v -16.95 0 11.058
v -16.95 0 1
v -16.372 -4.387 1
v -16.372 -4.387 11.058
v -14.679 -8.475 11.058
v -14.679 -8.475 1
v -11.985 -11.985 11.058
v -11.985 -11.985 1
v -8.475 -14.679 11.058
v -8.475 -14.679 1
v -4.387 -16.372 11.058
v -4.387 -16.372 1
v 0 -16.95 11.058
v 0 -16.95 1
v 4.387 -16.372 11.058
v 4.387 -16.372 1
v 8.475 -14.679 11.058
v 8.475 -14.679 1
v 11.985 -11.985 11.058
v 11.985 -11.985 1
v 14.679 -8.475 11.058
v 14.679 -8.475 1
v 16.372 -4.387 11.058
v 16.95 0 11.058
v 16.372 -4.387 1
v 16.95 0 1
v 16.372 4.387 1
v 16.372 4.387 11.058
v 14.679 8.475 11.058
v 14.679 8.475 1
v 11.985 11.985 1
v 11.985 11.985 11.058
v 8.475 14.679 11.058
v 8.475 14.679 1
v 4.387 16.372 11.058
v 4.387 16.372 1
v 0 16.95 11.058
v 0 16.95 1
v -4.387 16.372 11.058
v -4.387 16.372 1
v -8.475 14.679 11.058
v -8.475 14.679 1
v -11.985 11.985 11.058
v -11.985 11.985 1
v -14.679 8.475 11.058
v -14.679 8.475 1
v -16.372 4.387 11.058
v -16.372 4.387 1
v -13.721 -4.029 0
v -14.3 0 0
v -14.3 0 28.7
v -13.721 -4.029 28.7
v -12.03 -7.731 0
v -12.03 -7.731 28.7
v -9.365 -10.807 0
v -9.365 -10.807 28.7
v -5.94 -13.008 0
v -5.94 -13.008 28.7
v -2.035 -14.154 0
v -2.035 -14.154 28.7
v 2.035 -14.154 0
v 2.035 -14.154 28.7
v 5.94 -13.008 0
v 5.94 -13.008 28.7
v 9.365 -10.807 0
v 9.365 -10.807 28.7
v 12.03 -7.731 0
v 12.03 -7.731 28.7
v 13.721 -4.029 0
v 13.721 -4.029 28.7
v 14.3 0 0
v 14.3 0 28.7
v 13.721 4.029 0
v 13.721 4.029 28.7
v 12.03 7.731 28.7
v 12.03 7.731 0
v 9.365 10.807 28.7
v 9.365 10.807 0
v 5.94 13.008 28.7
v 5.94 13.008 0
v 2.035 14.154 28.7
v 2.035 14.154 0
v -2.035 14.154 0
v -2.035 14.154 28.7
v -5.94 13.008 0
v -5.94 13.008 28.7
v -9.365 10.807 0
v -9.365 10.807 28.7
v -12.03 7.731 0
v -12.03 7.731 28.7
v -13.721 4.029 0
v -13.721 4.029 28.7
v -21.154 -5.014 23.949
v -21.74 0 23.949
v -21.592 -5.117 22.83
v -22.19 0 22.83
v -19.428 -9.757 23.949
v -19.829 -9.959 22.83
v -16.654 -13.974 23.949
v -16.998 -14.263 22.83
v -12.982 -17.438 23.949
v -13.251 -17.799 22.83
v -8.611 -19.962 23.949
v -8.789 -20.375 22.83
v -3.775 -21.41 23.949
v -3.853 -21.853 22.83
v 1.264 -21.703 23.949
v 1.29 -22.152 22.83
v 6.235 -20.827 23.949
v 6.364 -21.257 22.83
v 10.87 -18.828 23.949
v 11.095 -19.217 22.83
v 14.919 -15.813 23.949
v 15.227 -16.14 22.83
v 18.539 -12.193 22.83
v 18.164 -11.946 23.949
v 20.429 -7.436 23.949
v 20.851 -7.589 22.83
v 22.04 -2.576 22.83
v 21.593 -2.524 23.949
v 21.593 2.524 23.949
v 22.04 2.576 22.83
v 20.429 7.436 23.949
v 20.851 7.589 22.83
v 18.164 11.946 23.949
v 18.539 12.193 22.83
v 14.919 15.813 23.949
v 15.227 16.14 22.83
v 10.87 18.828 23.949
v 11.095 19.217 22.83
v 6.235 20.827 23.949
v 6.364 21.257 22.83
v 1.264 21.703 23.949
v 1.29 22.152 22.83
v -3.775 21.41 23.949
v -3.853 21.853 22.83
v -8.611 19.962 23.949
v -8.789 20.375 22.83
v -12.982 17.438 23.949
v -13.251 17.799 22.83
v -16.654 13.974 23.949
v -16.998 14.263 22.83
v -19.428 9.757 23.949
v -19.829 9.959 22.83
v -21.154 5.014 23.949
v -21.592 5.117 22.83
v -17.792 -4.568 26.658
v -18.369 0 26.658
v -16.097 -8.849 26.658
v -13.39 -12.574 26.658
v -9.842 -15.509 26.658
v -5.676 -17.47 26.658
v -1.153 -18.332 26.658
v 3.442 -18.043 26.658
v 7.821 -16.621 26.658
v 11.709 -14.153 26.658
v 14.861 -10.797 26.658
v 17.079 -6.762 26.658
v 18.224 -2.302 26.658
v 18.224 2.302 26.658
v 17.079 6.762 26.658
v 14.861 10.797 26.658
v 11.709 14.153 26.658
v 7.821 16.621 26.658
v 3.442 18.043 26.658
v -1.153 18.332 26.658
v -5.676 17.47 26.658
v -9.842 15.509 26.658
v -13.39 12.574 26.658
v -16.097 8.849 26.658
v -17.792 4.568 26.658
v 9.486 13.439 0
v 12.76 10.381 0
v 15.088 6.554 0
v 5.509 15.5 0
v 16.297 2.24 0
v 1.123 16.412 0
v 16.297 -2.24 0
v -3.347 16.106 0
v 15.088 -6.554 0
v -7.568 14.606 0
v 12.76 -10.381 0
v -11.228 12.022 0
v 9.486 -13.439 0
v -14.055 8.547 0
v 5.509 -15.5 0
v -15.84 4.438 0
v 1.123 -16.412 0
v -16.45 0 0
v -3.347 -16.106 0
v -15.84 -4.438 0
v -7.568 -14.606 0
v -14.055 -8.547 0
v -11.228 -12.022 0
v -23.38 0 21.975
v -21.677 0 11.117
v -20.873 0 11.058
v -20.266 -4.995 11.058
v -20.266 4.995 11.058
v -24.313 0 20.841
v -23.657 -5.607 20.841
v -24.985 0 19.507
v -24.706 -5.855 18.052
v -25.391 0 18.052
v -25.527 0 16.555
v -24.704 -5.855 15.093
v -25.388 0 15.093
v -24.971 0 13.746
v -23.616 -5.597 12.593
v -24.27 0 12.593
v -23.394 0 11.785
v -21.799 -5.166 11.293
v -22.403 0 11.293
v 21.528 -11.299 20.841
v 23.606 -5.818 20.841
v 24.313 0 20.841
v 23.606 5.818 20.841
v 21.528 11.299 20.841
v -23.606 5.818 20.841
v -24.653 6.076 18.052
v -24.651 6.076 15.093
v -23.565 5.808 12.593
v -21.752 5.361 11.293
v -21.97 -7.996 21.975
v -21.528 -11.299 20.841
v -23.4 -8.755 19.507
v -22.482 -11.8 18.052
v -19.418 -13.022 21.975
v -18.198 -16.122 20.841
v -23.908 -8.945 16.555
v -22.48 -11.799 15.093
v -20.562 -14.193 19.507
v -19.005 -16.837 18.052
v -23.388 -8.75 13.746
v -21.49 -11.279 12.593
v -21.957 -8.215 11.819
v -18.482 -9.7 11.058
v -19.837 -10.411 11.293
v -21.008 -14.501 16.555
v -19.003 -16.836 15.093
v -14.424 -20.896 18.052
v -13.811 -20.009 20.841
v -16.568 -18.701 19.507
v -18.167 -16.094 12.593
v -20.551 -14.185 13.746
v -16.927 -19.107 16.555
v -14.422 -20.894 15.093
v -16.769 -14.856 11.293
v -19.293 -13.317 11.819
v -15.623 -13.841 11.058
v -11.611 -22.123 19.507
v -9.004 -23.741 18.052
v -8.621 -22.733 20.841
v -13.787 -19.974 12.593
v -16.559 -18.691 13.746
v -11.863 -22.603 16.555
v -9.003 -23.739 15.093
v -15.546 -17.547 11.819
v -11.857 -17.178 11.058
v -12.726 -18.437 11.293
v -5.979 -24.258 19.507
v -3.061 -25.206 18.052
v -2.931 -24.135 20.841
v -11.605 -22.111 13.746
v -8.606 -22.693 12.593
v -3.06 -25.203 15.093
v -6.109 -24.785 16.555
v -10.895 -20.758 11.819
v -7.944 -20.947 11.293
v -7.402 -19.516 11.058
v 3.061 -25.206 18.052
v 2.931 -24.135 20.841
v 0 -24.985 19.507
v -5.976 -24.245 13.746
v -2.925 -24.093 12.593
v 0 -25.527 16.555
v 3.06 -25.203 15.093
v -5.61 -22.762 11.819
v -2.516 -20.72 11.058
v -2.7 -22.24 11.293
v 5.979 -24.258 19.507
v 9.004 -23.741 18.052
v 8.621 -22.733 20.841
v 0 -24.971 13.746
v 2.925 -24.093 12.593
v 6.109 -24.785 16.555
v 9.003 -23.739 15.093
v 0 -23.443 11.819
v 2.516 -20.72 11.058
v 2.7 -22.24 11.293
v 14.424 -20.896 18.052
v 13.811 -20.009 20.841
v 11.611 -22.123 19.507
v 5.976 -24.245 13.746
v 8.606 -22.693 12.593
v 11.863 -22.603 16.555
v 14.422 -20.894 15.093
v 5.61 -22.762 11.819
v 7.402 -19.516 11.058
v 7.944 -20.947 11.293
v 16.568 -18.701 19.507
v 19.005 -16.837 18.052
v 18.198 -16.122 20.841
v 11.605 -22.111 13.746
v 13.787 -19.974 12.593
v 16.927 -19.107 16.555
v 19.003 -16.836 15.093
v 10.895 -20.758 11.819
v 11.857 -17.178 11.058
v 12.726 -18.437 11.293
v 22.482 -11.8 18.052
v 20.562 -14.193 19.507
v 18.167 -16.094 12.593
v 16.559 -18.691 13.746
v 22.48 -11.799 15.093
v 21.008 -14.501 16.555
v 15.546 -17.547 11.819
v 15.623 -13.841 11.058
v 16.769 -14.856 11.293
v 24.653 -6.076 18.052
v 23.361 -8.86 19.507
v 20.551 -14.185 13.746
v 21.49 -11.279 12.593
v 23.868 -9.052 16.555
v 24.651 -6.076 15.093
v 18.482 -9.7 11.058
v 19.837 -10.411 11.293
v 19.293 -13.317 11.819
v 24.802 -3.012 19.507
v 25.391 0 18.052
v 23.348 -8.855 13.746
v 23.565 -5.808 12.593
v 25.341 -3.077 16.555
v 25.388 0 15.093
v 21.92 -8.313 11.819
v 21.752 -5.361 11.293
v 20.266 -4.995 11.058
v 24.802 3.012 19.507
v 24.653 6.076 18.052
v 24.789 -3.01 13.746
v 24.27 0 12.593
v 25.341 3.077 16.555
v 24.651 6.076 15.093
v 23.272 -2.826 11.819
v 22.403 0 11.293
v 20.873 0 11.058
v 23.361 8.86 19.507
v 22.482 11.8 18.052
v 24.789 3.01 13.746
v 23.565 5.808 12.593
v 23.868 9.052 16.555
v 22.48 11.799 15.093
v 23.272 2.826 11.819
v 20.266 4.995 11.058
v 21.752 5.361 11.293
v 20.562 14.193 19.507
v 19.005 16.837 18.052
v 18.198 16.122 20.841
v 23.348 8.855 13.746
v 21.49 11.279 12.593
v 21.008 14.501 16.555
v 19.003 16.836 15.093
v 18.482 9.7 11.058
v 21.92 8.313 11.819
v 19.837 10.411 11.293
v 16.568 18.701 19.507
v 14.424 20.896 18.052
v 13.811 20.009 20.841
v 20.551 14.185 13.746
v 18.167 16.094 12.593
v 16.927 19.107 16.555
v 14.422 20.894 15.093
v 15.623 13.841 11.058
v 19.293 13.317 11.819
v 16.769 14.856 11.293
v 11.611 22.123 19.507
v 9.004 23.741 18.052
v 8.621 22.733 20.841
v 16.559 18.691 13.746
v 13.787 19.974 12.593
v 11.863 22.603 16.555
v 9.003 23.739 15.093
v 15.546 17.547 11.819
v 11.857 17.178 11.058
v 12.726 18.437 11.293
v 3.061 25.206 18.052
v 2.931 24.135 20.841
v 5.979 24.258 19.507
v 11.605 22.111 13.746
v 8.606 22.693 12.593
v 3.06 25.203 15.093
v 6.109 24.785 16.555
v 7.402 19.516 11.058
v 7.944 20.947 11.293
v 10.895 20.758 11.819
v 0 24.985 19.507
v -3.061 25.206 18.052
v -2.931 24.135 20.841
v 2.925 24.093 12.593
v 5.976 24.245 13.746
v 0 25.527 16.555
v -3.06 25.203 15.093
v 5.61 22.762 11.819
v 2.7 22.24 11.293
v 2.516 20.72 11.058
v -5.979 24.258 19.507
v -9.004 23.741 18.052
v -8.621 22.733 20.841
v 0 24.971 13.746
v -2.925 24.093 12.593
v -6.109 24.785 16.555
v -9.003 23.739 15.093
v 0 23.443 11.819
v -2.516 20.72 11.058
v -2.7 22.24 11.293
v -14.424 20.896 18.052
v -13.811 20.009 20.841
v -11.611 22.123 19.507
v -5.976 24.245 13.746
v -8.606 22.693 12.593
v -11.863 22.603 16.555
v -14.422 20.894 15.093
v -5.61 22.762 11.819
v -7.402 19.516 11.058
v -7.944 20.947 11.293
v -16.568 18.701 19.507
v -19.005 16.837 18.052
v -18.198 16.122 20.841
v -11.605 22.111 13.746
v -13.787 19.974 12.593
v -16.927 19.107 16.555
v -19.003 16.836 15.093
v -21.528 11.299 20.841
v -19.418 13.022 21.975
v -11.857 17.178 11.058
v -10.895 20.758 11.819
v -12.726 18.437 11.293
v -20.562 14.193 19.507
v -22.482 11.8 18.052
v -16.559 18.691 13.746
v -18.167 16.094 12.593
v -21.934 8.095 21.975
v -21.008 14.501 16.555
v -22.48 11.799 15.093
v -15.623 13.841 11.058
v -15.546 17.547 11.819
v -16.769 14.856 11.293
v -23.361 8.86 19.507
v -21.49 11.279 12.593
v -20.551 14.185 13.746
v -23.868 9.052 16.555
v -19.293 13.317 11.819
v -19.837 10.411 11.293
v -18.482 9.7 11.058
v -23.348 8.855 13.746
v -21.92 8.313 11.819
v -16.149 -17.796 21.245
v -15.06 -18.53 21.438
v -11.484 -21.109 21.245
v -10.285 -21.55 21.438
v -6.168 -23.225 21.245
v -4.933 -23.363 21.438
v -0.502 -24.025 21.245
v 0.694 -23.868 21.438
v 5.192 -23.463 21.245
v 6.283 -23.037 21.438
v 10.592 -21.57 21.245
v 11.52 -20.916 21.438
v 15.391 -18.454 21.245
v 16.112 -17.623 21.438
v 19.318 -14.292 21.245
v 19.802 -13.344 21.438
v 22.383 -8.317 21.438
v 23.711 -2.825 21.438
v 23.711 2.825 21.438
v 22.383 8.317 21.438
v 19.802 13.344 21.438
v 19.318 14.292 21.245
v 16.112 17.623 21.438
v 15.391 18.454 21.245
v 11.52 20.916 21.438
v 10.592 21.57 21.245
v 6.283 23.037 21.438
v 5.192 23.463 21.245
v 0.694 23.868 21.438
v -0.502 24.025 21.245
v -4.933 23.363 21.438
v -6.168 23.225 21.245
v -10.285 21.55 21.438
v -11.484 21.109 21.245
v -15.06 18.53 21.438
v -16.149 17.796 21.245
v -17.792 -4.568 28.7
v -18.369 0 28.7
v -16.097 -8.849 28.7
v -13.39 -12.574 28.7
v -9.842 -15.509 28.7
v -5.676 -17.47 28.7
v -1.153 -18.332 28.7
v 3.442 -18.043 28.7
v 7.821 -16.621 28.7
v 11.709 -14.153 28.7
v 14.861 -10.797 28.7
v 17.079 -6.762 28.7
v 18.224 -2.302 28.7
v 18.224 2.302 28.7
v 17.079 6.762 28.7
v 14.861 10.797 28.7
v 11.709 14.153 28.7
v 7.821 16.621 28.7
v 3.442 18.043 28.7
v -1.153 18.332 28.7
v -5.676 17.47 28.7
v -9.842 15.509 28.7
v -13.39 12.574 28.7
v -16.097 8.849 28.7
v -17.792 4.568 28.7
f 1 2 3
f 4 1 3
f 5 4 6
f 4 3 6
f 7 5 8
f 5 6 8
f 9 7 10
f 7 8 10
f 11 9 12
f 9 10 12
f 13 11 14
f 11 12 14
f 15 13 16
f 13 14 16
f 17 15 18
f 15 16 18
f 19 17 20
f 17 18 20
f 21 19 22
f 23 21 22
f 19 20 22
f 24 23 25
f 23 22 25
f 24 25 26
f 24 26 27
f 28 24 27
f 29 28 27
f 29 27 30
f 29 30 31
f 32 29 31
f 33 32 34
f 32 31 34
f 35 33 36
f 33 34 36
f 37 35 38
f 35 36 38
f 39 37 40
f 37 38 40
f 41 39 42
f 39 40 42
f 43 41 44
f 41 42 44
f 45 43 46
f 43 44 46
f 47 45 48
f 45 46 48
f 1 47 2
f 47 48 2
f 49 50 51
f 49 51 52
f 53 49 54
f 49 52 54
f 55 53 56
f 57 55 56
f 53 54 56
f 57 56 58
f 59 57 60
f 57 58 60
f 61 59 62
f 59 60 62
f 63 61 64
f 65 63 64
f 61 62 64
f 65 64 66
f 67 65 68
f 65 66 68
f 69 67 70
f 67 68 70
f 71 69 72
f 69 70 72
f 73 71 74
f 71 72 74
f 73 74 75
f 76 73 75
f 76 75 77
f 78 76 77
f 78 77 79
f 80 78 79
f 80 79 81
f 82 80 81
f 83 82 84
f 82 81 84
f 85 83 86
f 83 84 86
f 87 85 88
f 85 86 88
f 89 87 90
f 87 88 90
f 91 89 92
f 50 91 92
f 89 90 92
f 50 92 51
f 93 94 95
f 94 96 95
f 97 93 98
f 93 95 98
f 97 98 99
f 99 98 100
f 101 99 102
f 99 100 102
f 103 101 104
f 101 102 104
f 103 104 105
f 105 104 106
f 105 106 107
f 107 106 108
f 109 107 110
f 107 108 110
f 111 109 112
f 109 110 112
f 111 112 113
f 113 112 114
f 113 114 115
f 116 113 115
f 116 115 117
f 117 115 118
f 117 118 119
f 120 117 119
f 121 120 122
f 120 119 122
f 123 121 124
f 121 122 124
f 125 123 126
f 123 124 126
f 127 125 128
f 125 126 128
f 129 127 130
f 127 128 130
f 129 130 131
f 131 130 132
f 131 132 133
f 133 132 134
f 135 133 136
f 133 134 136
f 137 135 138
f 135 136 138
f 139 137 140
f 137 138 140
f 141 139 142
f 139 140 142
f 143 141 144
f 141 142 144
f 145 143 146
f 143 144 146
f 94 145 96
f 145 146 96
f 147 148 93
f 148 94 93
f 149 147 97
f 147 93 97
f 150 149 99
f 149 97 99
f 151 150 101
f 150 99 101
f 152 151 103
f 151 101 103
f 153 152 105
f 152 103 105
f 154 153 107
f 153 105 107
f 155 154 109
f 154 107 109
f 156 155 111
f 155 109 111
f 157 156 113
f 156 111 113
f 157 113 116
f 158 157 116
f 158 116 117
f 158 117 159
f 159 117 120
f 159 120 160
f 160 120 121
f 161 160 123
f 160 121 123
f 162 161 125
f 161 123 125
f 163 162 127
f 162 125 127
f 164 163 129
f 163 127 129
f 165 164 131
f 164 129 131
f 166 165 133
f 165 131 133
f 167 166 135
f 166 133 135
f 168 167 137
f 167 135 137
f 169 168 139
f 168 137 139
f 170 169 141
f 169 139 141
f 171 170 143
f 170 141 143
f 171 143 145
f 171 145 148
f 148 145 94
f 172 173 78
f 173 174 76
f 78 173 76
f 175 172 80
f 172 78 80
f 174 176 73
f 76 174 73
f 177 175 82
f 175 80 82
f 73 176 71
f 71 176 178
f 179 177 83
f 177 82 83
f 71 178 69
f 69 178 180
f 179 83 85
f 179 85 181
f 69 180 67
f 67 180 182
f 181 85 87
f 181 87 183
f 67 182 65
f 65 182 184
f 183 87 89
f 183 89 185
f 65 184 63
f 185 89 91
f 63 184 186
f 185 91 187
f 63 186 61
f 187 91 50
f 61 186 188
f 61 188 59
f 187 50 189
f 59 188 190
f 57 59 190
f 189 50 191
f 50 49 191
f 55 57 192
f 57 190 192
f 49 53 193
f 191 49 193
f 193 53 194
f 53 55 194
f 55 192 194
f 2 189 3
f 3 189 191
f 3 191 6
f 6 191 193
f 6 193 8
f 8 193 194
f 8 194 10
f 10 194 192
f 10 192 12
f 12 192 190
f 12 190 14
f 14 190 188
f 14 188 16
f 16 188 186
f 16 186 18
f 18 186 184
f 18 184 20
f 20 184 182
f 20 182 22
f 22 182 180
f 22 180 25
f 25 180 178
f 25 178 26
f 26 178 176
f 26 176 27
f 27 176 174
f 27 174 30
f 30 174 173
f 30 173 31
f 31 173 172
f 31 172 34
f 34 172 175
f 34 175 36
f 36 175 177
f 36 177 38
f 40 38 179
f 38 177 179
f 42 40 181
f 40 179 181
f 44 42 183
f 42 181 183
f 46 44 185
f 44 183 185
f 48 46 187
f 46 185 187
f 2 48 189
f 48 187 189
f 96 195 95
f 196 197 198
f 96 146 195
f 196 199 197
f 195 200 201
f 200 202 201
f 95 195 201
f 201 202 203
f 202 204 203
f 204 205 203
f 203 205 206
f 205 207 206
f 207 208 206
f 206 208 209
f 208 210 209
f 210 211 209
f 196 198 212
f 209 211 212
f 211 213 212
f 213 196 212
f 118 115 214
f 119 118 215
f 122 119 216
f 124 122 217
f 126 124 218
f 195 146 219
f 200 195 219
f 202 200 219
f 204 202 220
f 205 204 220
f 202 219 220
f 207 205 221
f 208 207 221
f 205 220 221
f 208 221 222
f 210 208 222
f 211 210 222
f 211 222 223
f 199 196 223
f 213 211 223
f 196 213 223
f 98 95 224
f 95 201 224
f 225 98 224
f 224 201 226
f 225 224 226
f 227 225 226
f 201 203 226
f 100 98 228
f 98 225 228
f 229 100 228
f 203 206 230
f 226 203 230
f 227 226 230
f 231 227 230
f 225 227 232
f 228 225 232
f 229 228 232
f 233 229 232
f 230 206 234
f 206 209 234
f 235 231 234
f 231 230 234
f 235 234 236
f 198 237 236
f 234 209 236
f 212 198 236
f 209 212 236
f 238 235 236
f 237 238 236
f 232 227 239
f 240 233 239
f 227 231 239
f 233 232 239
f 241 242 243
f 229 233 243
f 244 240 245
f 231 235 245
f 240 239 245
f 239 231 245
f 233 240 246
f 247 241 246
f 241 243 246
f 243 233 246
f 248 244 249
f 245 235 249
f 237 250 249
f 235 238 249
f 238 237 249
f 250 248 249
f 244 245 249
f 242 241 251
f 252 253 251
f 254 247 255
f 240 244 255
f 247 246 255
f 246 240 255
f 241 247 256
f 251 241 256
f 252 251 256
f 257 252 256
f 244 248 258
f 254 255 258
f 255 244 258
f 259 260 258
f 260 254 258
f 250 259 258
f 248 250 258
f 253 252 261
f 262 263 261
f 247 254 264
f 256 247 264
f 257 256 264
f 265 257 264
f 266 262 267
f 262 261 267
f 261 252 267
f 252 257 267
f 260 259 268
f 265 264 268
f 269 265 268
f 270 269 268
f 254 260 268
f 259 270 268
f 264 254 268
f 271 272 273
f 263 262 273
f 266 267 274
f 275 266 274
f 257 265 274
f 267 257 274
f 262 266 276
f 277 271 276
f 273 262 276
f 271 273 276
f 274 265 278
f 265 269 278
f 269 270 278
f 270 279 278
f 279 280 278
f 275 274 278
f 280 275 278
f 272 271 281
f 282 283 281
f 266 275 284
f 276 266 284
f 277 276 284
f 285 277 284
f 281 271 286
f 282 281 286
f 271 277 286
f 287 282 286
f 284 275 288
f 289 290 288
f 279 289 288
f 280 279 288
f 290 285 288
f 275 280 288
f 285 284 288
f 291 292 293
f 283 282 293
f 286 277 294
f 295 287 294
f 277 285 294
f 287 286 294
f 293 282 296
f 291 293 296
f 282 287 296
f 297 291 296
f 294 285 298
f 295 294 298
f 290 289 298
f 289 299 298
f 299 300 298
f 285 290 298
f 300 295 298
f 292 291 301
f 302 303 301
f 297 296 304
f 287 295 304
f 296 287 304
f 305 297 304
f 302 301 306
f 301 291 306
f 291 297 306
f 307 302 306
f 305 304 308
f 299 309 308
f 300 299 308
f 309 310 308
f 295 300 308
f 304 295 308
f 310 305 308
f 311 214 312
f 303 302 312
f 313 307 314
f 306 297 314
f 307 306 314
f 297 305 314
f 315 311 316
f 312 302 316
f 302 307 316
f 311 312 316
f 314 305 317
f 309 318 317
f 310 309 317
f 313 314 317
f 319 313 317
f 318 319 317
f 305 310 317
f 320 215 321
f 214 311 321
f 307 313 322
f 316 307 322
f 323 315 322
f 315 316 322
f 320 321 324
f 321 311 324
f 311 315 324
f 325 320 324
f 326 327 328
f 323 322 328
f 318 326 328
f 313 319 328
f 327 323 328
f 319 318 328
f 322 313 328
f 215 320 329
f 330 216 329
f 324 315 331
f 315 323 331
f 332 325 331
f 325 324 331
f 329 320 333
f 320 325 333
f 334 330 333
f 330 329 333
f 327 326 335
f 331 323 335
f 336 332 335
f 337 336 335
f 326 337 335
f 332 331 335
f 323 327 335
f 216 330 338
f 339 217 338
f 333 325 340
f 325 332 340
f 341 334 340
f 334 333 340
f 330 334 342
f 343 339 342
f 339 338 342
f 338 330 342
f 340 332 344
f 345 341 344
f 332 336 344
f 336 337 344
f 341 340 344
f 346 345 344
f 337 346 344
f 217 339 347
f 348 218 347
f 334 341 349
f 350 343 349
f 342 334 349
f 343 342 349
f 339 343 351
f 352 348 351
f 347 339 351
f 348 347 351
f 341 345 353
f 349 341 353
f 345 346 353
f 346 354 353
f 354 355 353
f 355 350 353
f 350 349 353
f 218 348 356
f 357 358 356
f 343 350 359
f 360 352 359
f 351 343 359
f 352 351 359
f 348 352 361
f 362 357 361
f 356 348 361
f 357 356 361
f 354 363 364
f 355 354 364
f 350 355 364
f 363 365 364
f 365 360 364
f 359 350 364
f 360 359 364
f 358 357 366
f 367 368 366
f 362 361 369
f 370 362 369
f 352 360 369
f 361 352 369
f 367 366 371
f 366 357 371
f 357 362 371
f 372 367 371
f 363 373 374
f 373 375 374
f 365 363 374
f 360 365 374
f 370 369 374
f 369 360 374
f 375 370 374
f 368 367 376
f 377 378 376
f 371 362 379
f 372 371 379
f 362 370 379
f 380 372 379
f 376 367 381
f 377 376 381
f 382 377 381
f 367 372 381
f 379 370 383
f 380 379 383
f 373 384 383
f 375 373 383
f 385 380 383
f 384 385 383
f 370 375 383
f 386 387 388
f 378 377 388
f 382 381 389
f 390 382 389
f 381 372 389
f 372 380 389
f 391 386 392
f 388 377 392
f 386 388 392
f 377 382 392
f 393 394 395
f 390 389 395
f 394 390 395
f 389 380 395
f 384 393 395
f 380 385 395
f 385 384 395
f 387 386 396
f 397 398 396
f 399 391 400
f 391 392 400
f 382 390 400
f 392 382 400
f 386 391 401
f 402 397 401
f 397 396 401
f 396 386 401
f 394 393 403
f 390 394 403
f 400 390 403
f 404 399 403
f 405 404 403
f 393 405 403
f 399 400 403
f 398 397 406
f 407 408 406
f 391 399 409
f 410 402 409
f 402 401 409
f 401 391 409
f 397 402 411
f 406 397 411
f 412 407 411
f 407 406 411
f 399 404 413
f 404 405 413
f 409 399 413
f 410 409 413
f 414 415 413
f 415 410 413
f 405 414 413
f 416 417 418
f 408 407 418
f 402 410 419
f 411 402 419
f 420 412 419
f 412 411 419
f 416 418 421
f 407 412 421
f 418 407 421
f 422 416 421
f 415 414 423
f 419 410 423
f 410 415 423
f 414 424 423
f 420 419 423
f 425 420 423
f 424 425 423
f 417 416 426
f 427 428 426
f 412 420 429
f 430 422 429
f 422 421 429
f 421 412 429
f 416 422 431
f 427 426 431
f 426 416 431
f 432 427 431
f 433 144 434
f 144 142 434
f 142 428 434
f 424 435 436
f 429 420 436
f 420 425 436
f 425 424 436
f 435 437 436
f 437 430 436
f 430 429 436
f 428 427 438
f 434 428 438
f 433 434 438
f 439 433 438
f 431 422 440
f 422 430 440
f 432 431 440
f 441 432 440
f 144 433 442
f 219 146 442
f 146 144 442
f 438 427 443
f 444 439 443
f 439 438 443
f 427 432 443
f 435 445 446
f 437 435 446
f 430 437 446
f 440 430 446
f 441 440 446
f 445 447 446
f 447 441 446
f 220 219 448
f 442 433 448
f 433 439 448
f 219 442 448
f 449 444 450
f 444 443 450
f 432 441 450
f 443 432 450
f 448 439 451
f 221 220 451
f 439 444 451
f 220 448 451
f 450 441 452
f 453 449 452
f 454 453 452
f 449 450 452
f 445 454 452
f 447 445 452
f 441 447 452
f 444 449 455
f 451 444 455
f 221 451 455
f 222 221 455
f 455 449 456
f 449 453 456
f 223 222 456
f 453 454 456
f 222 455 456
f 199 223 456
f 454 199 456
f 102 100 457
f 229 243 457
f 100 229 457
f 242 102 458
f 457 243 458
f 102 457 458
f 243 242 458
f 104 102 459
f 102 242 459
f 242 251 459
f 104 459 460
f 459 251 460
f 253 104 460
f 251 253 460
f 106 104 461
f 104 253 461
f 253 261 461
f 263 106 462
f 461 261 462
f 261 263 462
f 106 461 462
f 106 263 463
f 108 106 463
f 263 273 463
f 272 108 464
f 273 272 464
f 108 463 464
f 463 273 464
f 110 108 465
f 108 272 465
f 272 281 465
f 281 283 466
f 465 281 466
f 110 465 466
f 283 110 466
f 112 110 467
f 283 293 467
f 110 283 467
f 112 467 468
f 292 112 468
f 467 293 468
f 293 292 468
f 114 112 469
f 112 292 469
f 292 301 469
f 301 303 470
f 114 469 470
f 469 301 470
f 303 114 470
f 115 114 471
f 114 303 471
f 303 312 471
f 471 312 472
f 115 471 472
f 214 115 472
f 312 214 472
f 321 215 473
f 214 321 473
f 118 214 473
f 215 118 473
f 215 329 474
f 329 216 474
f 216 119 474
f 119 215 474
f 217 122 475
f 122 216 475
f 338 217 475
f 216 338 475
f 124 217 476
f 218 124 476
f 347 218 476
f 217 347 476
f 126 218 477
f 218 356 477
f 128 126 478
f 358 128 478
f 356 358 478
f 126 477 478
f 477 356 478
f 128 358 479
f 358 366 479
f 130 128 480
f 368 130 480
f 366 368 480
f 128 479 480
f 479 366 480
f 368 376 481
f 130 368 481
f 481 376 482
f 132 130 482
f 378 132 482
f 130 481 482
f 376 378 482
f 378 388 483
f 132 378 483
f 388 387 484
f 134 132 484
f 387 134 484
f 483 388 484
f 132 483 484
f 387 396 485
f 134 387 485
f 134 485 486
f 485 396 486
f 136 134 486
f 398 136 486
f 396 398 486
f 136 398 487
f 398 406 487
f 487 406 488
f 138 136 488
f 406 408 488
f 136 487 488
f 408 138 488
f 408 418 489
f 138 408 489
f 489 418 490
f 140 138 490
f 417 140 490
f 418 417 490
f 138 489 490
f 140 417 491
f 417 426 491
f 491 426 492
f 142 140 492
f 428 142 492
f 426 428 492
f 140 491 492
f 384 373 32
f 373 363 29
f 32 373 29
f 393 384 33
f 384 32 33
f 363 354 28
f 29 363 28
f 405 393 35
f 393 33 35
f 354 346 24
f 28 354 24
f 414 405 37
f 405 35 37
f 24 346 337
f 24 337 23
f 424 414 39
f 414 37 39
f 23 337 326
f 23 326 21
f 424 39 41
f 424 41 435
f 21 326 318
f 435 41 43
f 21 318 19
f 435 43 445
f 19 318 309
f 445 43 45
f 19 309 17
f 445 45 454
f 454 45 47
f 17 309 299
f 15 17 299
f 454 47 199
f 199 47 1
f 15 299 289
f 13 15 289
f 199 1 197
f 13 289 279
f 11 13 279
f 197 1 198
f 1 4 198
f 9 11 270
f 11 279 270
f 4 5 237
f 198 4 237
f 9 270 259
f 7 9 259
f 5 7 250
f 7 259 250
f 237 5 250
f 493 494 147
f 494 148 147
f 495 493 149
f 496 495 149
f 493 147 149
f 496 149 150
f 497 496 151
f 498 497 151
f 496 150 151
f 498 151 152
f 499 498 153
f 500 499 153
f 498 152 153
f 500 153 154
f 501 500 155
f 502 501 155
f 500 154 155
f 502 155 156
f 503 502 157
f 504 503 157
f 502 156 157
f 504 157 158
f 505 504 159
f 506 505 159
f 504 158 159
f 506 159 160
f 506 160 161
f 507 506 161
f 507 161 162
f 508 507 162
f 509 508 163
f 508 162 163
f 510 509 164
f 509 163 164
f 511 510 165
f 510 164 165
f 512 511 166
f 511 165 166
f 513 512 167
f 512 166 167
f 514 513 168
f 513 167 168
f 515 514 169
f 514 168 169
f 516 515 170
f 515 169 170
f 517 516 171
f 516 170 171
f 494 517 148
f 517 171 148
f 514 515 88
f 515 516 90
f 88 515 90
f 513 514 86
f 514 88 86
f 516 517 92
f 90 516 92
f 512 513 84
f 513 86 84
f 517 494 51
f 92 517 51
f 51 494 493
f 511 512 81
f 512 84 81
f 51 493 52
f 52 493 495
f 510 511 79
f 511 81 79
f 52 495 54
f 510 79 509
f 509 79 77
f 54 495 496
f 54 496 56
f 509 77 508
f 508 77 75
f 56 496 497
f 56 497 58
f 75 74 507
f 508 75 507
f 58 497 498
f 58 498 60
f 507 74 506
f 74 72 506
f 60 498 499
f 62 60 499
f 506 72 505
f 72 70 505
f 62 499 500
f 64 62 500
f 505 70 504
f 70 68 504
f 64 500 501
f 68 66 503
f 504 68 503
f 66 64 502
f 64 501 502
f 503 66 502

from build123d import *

# Parameters (mm, degrees)
F2_SIZE2 = 0.5
F2_SIZE  = 1


with BuildPart() as f1:
    # F0 (on Front) → F1 (revolve)
    with BuildSketch(Plane.XZ):
        with BuildLine():
            Line((-16.95, 11.0582131892), (-16.95, 0))
            Line((-16.95, 0), (-14.3, 0))
            Line((-14.3, 0), (-14.3, 28.7))
            Line((-14.3, 28.7), (-18.3687228709, 28.7))
            Line((-18.3687228709, 28.7), (-18.3687228709, 26.6580078751))
            Line((-18.3687228709, 26.6580078751), (-21.7402353883, 23.9487569779))
            Line((-21.7402353883, 23.9487569779), (-22.1896376461, 22.8297878057))
            add(Edge.make_bspline(
                [(-22.1896376461, 22.8297878057), (-26.9013587385, 20.3616116196), (-26.7662014812, 11.0357832164), (-20.8725556731, 11.0582131892)],
                knots=[0, 0, 0, 0, 11.8450273902, 11.8450273902, 11.8450273902, 11.8450273902], degree=3))
            Line((-20.8725556731, 11.0582131892), (-16.95, 11.0582131892))
        make_face()
    revolve(axis=Axis((0, 0, 14.35), (0, 0, 1)))

    # F2
    f2_edges = [f1.edges().sort_by_distance(p)[0] for p in [
        (16.95, 0, 0),
    ]]
    f2_side = f1.faces().sort_by_distance((16.95, 0, 5.529107))[0]
    chamfer(f2_edges, length=F2_SIZE, length2=F2_SIZE2, reference=f2_side)


solid = f1.part
